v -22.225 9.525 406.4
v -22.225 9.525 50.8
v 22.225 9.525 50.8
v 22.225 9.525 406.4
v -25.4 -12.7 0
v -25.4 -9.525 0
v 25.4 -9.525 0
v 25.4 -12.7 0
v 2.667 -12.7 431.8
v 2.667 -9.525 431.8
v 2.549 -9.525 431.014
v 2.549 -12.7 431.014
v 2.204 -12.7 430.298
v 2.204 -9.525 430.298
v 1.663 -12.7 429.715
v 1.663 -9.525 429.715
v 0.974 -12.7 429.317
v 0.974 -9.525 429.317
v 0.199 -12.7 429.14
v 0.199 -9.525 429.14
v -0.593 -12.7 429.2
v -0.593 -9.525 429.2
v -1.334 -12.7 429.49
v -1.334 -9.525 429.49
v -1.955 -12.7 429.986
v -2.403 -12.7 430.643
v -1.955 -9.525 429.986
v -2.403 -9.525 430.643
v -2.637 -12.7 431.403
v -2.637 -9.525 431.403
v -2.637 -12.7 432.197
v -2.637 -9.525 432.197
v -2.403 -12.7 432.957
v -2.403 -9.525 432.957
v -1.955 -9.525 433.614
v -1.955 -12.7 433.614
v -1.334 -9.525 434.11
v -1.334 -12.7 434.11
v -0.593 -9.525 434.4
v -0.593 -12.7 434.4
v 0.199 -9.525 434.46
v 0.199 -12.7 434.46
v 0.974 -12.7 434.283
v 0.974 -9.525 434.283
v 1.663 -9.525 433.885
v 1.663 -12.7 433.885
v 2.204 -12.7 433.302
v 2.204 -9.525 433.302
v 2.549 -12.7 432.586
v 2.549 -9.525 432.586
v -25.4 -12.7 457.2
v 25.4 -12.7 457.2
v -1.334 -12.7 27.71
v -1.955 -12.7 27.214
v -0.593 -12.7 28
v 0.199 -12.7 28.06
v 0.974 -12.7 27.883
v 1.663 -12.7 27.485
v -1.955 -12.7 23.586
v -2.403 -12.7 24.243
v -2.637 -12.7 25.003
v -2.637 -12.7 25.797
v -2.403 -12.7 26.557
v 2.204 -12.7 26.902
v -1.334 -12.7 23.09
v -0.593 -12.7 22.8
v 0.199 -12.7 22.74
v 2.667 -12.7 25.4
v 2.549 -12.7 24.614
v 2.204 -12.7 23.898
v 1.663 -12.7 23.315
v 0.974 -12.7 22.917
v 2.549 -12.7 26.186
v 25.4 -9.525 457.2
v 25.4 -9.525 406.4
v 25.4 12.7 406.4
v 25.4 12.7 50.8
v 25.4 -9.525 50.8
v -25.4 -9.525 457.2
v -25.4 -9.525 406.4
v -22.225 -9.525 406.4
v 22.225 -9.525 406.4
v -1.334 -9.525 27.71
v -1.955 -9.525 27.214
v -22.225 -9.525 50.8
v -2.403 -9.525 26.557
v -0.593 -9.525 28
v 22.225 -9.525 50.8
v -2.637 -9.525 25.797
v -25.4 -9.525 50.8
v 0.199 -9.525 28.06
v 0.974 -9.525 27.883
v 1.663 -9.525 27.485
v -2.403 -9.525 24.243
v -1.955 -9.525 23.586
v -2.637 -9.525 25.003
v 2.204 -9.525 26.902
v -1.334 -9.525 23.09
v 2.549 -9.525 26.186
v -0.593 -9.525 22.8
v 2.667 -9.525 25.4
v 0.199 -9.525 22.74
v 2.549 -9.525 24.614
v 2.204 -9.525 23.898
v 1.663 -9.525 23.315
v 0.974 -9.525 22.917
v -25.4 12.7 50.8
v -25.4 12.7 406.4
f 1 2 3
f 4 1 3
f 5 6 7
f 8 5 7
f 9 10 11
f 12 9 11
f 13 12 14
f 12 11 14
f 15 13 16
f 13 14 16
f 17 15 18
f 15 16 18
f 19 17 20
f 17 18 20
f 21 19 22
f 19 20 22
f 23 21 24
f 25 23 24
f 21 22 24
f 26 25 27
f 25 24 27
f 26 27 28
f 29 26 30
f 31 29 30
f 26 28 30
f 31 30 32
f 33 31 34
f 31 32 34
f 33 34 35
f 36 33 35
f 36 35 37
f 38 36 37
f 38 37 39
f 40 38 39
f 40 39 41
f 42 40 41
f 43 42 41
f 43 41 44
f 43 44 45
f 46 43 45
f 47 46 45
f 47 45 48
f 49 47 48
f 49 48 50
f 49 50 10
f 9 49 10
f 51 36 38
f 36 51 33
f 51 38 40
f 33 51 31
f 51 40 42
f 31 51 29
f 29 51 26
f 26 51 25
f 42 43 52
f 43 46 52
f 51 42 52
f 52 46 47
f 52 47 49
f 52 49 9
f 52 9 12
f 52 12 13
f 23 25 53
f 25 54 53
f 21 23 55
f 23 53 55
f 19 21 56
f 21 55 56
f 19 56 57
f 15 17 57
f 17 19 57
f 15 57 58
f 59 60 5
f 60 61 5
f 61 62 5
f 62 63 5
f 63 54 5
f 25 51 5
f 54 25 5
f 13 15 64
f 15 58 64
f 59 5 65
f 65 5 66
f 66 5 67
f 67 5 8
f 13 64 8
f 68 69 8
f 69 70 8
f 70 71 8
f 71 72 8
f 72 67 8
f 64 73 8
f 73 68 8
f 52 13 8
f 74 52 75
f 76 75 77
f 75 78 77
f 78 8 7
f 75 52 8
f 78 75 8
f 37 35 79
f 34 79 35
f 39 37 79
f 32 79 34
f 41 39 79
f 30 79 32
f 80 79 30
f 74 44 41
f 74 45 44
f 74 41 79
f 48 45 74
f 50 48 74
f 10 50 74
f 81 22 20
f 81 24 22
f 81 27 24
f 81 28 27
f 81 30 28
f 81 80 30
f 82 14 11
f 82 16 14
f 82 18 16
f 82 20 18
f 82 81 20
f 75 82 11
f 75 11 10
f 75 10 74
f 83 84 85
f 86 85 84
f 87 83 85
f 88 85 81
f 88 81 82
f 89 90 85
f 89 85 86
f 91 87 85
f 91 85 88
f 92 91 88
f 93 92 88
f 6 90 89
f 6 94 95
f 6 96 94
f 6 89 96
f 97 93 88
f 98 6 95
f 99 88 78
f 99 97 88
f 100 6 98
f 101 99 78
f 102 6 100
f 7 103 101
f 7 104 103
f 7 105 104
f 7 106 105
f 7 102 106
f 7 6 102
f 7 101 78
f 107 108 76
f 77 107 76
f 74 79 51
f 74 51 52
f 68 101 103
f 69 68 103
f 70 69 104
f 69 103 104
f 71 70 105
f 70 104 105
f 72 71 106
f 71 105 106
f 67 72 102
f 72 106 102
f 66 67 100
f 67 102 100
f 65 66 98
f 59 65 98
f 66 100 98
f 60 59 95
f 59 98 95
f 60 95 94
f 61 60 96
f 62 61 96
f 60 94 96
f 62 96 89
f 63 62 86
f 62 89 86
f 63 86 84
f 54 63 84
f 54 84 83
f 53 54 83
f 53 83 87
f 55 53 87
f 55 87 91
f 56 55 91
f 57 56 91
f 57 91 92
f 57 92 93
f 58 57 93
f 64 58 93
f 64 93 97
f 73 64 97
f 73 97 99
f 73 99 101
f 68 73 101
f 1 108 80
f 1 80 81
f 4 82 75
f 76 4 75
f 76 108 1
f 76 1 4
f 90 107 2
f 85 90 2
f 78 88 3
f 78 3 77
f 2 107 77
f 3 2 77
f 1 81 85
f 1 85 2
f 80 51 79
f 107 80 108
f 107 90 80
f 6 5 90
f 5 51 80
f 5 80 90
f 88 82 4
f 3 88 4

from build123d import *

# Parameters (mm, degrees)
SKETCH1_W           = 50.8
SKETCH1_H           = 25.4
SKETCH1_W_2         = 44.45
SKETCH1_H_2         = 19.05
BOSS_EXTRUDE1_DEPTH = 457.2
SKETCH2_R           = 2.667
CUT_EXTRUDE1_DEPTH  = 26.4
SKETCH3_W           = 50.8
SKETCH3_H           = 50.8
CUT_EXTRUDE2_DEPTH  = 22.225


with BuildPart() as part:
    # Sketch1 → Boss-Extrude1 (new body)
    with BuildSketch(Plane.XY):
        Rectangle(SKETCH1_W, SKETCH1_H)
        Rectangle(SKETCH1_W_2, SKETCH1_H_2, mode=Mode.SUBTRACT)
    extrude(amount=BOSS_EXTRUDE1_DEPTH)

    # Sketch2 → Cut-Extrude1 (cut, through all)
    with BuildSketch(Plane(origin=(0, 12.7, 0), x_dir=(1, 0, 0), z_dir=(0, 1, 0))):
        with Locations((0, -431.8)):
            Circle(SKETCH2_R)
        with Locations((0, -25.4)):
            Circle(SKETCH2_R)
    extrude(amount=-CUT_EXTRUDE1_DEPTH, mode=Mode.SUBTRACT)

    # Sketch3 → Cut-Extrude2 (cut)
    with BuildSketch(Plane(origin=(0, 12.7, 0), x_dir=(1, 0, 0), z_dir=(0, 1, 0))):
        with Locations((0, -431.8)):
            Rectangle(SKETCH3_W, SKETCH3_H)
        with Locations((0, -25.4)):
            Rectangle(SKETCH3_W, SKETCH3_H)
    extrude(amount=-CUT_EXTRUDE2_DEPTH, mode=Mode.SUBTRACT)


solid = part.part
